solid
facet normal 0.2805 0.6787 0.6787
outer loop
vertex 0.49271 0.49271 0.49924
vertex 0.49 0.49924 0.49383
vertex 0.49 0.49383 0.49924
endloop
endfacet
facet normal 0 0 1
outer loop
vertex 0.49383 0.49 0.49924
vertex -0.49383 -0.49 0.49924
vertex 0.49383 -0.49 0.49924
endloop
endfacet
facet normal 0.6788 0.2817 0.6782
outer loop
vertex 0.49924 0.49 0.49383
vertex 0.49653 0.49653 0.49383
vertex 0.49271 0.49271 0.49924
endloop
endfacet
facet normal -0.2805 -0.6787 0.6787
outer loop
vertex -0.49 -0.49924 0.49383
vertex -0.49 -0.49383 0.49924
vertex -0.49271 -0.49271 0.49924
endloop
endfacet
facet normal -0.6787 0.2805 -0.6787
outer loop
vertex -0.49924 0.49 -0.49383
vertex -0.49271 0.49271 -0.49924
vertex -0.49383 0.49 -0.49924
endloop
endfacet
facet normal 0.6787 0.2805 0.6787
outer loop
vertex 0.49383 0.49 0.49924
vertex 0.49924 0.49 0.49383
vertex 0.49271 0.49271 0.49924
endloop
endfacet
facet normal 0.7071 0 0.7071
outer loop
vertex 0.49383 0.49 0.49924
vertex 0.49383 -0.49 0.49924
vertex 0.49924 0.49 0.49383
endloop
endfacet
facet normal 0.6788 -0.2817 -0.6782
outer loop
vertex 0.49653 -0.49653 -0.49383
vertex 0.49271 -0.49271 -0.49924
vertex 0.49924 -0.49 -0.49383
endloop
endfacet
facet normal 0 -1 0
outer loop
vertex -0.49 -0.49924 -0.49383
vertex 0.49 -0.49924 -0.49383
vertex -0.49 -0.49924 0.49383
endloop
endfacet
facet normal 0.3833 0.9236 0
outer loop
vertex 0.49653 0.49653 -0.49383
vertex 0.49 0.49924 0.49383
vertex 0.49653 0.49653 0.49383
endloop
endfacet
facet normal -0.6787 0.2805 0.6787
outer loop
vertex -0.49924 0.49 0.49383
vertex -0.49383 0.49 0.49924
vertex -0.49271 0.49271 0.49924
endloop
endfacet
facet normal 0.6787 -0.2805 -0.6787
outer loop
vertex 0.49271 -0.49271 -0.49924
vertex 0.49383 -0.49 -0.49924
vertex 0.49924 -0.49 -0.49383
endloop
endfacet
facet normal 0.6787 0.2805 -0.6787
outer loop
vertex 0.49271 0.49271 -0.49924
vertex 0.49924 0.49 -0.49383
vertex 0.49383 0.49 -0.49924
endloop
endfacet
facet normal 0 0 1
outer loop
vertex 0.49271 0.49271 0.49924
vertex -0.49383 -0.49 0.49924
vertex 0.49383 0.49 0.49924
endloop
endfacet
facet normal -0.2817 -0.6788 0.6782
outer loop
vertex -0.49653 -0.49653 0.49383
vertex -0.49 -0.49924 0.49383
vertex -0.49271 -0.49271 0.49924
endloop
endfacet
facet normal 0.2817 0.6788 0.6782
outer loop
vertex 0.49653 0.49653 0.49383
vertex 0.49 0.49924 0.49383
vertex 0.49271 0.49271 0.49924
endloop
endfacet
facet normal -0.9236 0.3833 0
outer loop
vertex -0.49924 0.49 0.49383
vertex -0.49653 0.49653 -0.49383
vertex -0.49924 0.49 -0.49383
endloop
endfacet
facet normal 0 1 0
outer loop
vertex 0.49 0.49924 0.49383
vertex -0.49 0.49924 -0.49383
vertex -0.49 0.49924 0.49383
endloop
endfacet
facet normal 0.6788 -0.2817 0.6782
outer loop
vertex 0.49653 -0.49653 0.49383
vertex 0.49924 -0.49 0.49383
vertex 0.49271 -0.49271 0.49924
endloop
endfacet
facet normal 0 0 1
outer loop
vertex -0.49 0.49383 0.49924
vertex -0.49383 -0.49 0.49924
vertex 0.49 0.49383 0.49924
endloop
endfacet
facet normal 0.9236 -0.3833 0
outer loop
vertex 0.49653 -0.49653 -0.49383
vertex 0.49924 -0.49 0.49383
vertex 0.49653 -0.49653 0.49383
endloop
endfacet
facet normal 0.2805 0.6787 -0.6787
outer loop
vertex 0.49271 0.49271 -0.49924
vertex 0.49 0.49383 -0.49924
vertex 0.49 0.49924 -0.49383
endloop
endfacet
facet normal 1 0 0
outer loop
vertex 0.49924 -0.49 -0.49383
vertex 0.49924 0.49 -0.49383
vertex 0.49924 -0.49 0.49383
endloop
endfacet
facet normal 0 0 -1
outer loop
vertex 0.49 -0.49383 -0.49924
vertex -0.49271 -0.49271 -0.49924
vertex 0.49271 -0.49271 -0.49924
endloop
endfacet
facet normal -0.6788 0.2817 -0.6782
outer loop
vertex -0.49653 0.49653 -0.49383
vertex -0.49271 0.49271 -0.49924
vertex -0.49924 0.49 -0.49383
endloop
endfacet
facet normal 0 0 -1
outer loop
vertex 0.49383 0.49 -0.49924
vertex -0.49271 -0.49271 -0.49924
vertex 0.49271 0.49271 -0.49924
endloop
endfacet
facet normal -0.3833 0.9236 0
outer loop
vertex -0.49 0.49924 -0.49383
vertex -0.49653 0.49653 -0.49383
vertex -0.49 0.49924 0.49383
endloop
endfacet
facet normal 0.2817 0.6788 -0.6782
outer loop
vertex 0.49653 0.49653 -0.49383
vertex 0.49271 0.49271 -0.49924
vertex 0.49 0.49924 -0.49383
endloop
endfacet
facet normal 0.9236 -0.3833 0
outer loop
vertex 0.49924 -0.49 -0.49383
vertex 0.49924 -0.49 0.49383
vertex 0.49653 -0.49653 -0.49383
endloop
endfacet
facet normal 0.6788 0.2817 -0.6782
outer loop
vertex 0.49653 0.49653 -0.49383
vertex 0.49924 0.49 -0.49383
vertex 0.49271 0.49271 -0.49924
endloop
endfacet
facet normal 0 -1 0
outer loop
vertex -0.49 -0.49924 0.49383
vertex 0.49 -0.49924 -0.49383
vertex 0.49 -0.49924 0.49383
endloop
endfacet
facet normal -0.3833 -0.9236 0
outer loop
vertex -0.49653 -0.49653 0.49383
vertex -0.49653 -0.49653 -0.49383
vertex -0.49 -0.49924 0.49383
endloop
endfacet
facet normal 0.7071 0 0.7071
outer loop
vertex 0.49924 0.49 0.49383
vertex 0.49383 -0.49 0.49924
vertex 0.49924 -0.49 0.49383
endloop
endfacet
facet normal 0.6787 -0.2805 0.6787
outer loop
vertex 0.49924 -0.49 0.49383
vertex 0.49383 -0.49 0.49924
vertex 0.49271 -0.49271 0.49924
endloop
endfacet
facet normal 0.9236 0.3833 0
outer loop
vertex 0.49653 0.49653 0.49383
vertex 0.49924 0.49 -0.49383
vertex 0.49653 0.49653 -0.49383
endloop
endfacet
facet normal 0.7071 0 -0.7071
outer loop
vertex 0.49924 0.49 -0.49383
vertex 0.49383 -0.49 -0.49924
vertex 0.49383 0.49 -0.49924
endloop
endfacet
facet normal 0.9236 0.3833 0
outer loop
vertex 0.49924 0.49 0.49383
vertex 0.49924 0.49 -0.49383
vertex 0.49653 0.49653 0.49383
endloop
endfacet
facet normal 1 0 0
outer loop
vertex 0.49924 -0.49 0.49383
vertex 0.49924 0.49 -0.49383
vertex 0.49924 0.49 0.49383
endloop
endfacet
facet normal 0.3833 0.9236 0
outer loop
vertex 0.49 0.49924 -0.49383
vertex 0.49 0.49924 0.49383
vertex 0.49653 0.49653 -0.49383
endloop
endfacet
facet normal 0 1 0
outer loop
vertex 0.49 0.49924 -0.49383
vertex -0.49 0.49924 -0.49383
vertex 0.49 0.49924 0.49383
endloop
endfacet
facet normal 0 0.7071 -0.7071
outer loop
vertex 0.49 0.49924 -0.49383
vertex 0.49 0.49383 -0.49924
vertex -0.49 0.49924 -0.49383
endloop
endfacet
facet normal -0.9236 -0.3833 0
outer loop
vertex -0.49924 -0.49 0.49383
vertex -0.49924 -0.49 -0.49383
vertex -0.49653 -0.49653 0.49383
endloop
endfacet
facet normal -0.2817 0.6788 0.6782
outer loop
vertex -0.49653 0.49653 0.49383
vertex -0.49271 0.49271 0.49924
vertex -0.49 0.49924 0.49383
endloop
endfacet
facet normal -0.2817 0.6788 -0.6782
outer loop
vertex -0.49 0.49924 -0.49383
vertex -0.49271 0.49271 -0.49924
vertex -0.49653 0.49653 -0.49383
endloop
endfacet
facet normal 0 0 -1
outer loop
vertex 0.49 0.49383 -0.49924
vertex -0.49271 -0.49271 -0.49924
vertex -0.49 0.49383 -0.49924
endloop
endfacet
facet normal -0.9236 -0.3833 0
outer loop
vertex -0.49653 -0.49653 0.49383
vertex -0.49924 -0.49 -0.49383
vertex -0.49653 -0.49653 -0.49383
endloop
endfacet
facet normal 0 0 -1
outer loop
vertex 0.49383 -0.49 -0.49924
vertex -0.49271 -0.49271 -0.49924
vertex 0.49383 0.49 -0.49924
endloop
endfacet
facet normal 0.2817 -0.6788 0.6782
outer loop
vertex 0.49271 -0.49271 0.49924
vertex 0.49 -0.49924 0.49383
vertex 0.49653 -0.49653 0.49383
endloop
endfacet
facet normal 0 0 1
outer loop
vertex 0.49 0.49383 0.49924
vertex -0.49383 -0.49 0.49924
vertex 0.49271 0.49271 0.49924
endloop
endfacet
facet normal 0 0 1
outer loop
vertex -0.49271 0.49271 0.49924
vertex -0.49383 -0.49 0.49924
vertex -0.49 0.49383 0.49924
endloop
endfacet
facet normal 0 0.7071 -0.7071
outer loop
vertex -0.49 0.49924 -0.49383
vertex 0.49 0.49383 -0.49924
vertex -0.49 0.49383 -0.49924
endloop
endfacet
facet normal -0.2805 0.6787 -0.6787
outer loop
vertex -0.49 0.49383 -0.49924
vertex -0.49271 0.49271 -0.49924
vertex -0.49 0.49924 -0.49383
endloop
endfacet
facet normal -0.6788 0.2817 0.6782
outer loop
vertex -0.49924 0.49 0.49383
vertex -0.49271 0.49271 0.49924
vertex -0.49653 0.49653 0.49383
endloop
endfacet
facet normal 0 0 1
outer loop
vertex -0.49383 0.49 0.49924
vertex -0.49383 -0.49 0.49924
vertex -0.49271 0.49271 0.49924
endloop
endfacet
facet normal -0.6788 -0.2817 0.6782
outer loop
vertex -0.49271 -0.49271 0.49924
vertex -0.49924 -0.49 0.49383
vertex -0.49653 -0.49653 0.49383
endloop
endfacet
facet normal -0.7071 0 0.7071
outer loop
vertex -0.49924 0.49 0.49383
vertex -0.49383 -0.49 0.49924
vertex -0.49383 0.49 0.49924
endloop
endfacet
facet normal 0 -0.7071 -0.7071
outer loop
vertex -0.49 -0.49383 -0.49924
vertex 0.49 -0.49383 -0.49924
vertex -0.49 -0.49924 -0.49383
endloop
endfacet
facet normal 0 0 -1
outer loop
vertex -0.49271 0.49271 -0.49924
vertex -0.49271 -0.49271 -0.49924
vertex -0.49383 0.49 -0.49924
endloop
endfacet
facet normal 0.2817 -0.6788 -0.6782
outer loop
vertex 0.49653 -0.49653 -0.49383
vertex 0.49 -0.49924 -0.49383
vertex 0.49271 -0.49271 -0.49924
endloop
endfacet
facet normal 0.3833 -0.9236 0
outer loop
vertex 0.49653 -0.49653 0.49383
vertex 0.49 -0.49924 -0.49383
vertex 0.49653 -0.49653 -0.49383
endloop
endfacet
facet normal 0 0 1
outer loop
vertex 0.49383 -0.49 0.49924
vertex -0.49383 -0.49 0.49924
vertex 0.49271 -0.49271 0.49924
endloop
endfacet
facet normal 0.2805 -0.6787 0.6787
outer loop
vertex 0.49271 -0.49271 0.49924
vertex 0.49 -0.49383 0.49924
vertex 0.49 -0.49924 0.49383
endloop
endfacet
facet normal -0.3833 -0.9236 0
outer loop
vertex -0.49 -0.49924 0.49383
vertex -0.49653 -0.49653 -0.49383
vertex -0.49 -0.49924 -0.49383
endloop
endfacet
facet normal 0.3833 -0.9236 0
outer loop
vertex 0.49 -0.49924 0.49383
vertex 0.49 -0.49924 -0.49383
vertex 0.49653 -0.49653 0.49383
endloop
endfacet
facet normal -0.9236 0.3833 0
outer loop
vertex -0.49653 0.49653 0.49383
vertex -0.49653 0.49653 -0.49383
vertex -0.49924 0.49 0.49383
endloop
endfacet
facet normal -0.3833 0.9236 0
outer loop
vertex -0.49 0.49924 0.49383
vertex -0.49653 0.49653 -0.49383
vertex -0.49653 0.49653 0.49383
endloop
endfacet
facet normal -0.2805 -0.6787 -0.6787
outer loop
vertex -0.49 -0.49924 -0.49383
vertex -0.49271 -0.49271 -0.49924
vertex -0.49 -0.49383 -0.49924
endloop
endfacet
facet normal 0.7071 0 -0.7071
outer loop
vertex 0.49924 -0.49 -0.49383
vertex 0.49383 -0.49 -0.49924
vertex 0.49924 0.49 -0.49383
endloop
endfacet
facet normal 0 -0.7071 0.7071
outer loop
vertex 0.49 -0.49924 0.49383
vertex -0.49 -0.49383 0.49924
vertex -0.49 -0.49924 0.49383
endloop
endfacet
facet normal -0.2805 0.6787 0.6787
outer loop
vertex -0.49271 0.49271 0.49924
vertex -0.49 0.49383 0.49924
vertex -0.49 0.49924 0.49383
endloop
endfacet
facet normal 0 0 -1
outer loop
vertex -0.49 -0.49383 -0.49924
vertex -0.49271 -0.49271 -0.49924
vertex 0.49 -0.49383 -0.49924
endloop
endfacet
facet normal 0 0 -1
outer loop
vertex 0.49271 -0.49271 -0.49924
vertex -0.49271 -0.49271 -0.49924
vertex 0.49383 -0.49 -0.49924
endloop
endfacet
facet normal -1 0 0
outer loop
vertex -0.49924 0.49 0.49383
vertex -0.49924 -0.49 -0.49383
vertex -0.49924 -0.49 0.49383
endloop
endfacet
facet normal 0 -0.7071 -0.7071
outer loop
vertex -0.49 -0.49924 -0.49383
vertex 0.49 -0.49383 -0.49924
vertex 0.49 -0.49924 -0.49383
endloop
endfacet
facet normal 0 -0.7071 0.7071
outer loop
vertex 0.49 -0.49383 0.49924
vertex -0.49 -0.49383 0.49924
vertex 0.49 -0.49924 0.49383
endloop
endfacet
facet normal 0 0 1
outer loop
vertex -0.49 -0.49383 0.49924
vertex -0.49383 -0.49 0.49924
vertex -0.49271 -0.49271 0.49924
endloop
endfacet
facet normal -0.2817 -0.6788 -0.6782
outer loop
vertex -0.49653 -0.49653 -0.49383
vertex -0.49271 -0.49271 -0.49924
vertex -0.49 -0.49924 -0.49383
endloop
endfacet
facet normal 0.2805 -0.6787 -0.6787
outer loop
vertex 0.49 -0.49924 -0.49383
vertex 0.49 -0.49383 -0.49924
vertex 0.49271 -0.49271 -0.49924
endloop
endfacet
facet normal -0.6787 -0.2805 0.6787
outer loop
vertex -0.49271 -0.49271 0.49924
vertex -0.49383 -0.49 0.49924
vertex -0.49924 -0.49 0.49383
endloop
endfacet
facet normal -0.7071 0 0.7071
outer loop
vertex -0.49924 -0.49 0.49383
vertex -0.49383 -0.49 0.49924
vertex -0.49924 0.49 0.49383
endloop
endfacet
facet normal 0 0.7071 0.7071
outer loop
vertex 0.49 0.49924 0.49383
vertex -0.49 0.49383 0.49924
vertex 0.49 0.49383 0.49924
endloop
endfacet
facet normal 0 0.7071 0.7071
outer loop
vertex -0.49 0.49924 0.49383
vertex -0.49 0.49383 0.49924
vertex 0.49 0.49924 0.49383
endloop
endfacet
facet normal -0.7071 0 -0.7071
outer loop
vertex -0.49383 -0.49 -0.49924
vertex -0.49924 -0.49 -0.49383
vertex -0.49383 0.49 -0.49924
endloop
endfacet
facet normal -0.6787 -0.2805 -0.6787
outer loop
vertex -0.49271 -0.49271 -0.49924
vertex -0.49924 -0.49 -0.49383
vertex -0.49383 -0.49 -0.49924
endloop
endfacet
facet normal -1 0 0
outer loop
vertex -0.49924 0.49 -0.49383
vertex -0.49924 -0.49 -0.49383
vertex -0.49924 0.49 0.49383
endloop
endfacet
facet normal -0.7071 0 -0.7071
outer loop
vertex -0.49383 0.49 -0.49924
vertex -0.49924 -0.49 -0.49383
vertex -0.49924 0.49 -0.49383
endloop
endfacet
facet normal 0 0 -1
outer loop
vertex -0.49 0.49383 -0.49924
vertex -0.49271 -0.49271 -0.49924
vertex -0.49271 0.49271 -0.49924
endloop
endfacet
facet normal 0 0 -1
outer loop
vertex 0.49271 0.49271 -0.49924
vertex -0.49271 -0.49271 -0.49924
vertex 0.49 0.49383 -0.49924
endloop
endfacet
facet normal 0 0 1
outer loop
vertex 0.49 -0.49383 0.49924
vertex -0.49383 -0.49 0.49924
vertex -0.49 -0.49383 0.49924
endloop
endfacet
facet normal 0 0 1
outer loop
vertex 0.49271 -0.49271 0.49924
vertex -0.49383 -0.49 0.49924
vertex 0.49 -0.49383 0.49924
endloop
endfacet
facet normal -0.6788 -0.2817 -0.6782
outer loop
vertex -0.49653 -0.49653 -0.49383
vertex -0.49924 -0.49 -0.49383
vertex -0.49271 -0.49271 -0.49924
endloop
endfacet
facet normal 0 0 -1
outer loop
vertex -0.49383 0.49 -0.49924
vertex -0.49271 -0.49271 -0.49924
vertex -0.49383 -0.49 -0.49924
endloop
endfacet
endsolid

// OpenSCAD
// file: lib.scad
function x(v) = v[0];
function y(v) = v[1];
function z(v) = v[2];
function add(v1,v2) = [ for (i = [ 0 : len(v1)-1 ]) v1[i] + v2[i] ];
function xv(d) = [d,0,0];
function yv(d) = [0,d,0];
function zv(d) = [0,0,d];

module box(v) { cube(size=v, center=true); }
module cyl(r1,r2,h) { cylinder(r1=r1, r2=r2, h=h, center=true); }

function grow(n,v) = [x(v)+n*2, y(v)+n*2, z(v)+n*2];

module rbox(v, radius=1) {
	cx = x(v)/2-radius;
	cy = y(v)/2-radius;
	cz = z(v)/2-radius;

	hull() {
		translate([cx,cy,cz]) sphere(r=radius);
		translate([cx,cy,-cz]) sphere(r=radius);
		translate([cx,-cy,cz]) sphere(r=radius);
		translate([cx,-cy,-cz]) sphere(r=radius);
		translate([-cx,cy,cz]) sphere(r=radius);
		translate([-cx,cy,-cz]) sphere(r=radius);
		translate([-cx,-cy,cz]) sphere(r=radius);
		translate([-cx,-cy,-cz]) sphere(r=radius);
	}
}

module fillet(r=1) {
  minkowski() {
    difference() {
      children();
      minkowski() {
        difference() {
          minkowski() {
            children();
            sphere(r=r);
          }
          children();
        }
        sphere(r=r);
      }
    }
    sphere(r=r);
  }
}
// main file
use <lib.scad>

rbox([1.0, 1.0, 1.0],0.01,$fn=8);
//box([1.0, 1.0, 1.0]);
